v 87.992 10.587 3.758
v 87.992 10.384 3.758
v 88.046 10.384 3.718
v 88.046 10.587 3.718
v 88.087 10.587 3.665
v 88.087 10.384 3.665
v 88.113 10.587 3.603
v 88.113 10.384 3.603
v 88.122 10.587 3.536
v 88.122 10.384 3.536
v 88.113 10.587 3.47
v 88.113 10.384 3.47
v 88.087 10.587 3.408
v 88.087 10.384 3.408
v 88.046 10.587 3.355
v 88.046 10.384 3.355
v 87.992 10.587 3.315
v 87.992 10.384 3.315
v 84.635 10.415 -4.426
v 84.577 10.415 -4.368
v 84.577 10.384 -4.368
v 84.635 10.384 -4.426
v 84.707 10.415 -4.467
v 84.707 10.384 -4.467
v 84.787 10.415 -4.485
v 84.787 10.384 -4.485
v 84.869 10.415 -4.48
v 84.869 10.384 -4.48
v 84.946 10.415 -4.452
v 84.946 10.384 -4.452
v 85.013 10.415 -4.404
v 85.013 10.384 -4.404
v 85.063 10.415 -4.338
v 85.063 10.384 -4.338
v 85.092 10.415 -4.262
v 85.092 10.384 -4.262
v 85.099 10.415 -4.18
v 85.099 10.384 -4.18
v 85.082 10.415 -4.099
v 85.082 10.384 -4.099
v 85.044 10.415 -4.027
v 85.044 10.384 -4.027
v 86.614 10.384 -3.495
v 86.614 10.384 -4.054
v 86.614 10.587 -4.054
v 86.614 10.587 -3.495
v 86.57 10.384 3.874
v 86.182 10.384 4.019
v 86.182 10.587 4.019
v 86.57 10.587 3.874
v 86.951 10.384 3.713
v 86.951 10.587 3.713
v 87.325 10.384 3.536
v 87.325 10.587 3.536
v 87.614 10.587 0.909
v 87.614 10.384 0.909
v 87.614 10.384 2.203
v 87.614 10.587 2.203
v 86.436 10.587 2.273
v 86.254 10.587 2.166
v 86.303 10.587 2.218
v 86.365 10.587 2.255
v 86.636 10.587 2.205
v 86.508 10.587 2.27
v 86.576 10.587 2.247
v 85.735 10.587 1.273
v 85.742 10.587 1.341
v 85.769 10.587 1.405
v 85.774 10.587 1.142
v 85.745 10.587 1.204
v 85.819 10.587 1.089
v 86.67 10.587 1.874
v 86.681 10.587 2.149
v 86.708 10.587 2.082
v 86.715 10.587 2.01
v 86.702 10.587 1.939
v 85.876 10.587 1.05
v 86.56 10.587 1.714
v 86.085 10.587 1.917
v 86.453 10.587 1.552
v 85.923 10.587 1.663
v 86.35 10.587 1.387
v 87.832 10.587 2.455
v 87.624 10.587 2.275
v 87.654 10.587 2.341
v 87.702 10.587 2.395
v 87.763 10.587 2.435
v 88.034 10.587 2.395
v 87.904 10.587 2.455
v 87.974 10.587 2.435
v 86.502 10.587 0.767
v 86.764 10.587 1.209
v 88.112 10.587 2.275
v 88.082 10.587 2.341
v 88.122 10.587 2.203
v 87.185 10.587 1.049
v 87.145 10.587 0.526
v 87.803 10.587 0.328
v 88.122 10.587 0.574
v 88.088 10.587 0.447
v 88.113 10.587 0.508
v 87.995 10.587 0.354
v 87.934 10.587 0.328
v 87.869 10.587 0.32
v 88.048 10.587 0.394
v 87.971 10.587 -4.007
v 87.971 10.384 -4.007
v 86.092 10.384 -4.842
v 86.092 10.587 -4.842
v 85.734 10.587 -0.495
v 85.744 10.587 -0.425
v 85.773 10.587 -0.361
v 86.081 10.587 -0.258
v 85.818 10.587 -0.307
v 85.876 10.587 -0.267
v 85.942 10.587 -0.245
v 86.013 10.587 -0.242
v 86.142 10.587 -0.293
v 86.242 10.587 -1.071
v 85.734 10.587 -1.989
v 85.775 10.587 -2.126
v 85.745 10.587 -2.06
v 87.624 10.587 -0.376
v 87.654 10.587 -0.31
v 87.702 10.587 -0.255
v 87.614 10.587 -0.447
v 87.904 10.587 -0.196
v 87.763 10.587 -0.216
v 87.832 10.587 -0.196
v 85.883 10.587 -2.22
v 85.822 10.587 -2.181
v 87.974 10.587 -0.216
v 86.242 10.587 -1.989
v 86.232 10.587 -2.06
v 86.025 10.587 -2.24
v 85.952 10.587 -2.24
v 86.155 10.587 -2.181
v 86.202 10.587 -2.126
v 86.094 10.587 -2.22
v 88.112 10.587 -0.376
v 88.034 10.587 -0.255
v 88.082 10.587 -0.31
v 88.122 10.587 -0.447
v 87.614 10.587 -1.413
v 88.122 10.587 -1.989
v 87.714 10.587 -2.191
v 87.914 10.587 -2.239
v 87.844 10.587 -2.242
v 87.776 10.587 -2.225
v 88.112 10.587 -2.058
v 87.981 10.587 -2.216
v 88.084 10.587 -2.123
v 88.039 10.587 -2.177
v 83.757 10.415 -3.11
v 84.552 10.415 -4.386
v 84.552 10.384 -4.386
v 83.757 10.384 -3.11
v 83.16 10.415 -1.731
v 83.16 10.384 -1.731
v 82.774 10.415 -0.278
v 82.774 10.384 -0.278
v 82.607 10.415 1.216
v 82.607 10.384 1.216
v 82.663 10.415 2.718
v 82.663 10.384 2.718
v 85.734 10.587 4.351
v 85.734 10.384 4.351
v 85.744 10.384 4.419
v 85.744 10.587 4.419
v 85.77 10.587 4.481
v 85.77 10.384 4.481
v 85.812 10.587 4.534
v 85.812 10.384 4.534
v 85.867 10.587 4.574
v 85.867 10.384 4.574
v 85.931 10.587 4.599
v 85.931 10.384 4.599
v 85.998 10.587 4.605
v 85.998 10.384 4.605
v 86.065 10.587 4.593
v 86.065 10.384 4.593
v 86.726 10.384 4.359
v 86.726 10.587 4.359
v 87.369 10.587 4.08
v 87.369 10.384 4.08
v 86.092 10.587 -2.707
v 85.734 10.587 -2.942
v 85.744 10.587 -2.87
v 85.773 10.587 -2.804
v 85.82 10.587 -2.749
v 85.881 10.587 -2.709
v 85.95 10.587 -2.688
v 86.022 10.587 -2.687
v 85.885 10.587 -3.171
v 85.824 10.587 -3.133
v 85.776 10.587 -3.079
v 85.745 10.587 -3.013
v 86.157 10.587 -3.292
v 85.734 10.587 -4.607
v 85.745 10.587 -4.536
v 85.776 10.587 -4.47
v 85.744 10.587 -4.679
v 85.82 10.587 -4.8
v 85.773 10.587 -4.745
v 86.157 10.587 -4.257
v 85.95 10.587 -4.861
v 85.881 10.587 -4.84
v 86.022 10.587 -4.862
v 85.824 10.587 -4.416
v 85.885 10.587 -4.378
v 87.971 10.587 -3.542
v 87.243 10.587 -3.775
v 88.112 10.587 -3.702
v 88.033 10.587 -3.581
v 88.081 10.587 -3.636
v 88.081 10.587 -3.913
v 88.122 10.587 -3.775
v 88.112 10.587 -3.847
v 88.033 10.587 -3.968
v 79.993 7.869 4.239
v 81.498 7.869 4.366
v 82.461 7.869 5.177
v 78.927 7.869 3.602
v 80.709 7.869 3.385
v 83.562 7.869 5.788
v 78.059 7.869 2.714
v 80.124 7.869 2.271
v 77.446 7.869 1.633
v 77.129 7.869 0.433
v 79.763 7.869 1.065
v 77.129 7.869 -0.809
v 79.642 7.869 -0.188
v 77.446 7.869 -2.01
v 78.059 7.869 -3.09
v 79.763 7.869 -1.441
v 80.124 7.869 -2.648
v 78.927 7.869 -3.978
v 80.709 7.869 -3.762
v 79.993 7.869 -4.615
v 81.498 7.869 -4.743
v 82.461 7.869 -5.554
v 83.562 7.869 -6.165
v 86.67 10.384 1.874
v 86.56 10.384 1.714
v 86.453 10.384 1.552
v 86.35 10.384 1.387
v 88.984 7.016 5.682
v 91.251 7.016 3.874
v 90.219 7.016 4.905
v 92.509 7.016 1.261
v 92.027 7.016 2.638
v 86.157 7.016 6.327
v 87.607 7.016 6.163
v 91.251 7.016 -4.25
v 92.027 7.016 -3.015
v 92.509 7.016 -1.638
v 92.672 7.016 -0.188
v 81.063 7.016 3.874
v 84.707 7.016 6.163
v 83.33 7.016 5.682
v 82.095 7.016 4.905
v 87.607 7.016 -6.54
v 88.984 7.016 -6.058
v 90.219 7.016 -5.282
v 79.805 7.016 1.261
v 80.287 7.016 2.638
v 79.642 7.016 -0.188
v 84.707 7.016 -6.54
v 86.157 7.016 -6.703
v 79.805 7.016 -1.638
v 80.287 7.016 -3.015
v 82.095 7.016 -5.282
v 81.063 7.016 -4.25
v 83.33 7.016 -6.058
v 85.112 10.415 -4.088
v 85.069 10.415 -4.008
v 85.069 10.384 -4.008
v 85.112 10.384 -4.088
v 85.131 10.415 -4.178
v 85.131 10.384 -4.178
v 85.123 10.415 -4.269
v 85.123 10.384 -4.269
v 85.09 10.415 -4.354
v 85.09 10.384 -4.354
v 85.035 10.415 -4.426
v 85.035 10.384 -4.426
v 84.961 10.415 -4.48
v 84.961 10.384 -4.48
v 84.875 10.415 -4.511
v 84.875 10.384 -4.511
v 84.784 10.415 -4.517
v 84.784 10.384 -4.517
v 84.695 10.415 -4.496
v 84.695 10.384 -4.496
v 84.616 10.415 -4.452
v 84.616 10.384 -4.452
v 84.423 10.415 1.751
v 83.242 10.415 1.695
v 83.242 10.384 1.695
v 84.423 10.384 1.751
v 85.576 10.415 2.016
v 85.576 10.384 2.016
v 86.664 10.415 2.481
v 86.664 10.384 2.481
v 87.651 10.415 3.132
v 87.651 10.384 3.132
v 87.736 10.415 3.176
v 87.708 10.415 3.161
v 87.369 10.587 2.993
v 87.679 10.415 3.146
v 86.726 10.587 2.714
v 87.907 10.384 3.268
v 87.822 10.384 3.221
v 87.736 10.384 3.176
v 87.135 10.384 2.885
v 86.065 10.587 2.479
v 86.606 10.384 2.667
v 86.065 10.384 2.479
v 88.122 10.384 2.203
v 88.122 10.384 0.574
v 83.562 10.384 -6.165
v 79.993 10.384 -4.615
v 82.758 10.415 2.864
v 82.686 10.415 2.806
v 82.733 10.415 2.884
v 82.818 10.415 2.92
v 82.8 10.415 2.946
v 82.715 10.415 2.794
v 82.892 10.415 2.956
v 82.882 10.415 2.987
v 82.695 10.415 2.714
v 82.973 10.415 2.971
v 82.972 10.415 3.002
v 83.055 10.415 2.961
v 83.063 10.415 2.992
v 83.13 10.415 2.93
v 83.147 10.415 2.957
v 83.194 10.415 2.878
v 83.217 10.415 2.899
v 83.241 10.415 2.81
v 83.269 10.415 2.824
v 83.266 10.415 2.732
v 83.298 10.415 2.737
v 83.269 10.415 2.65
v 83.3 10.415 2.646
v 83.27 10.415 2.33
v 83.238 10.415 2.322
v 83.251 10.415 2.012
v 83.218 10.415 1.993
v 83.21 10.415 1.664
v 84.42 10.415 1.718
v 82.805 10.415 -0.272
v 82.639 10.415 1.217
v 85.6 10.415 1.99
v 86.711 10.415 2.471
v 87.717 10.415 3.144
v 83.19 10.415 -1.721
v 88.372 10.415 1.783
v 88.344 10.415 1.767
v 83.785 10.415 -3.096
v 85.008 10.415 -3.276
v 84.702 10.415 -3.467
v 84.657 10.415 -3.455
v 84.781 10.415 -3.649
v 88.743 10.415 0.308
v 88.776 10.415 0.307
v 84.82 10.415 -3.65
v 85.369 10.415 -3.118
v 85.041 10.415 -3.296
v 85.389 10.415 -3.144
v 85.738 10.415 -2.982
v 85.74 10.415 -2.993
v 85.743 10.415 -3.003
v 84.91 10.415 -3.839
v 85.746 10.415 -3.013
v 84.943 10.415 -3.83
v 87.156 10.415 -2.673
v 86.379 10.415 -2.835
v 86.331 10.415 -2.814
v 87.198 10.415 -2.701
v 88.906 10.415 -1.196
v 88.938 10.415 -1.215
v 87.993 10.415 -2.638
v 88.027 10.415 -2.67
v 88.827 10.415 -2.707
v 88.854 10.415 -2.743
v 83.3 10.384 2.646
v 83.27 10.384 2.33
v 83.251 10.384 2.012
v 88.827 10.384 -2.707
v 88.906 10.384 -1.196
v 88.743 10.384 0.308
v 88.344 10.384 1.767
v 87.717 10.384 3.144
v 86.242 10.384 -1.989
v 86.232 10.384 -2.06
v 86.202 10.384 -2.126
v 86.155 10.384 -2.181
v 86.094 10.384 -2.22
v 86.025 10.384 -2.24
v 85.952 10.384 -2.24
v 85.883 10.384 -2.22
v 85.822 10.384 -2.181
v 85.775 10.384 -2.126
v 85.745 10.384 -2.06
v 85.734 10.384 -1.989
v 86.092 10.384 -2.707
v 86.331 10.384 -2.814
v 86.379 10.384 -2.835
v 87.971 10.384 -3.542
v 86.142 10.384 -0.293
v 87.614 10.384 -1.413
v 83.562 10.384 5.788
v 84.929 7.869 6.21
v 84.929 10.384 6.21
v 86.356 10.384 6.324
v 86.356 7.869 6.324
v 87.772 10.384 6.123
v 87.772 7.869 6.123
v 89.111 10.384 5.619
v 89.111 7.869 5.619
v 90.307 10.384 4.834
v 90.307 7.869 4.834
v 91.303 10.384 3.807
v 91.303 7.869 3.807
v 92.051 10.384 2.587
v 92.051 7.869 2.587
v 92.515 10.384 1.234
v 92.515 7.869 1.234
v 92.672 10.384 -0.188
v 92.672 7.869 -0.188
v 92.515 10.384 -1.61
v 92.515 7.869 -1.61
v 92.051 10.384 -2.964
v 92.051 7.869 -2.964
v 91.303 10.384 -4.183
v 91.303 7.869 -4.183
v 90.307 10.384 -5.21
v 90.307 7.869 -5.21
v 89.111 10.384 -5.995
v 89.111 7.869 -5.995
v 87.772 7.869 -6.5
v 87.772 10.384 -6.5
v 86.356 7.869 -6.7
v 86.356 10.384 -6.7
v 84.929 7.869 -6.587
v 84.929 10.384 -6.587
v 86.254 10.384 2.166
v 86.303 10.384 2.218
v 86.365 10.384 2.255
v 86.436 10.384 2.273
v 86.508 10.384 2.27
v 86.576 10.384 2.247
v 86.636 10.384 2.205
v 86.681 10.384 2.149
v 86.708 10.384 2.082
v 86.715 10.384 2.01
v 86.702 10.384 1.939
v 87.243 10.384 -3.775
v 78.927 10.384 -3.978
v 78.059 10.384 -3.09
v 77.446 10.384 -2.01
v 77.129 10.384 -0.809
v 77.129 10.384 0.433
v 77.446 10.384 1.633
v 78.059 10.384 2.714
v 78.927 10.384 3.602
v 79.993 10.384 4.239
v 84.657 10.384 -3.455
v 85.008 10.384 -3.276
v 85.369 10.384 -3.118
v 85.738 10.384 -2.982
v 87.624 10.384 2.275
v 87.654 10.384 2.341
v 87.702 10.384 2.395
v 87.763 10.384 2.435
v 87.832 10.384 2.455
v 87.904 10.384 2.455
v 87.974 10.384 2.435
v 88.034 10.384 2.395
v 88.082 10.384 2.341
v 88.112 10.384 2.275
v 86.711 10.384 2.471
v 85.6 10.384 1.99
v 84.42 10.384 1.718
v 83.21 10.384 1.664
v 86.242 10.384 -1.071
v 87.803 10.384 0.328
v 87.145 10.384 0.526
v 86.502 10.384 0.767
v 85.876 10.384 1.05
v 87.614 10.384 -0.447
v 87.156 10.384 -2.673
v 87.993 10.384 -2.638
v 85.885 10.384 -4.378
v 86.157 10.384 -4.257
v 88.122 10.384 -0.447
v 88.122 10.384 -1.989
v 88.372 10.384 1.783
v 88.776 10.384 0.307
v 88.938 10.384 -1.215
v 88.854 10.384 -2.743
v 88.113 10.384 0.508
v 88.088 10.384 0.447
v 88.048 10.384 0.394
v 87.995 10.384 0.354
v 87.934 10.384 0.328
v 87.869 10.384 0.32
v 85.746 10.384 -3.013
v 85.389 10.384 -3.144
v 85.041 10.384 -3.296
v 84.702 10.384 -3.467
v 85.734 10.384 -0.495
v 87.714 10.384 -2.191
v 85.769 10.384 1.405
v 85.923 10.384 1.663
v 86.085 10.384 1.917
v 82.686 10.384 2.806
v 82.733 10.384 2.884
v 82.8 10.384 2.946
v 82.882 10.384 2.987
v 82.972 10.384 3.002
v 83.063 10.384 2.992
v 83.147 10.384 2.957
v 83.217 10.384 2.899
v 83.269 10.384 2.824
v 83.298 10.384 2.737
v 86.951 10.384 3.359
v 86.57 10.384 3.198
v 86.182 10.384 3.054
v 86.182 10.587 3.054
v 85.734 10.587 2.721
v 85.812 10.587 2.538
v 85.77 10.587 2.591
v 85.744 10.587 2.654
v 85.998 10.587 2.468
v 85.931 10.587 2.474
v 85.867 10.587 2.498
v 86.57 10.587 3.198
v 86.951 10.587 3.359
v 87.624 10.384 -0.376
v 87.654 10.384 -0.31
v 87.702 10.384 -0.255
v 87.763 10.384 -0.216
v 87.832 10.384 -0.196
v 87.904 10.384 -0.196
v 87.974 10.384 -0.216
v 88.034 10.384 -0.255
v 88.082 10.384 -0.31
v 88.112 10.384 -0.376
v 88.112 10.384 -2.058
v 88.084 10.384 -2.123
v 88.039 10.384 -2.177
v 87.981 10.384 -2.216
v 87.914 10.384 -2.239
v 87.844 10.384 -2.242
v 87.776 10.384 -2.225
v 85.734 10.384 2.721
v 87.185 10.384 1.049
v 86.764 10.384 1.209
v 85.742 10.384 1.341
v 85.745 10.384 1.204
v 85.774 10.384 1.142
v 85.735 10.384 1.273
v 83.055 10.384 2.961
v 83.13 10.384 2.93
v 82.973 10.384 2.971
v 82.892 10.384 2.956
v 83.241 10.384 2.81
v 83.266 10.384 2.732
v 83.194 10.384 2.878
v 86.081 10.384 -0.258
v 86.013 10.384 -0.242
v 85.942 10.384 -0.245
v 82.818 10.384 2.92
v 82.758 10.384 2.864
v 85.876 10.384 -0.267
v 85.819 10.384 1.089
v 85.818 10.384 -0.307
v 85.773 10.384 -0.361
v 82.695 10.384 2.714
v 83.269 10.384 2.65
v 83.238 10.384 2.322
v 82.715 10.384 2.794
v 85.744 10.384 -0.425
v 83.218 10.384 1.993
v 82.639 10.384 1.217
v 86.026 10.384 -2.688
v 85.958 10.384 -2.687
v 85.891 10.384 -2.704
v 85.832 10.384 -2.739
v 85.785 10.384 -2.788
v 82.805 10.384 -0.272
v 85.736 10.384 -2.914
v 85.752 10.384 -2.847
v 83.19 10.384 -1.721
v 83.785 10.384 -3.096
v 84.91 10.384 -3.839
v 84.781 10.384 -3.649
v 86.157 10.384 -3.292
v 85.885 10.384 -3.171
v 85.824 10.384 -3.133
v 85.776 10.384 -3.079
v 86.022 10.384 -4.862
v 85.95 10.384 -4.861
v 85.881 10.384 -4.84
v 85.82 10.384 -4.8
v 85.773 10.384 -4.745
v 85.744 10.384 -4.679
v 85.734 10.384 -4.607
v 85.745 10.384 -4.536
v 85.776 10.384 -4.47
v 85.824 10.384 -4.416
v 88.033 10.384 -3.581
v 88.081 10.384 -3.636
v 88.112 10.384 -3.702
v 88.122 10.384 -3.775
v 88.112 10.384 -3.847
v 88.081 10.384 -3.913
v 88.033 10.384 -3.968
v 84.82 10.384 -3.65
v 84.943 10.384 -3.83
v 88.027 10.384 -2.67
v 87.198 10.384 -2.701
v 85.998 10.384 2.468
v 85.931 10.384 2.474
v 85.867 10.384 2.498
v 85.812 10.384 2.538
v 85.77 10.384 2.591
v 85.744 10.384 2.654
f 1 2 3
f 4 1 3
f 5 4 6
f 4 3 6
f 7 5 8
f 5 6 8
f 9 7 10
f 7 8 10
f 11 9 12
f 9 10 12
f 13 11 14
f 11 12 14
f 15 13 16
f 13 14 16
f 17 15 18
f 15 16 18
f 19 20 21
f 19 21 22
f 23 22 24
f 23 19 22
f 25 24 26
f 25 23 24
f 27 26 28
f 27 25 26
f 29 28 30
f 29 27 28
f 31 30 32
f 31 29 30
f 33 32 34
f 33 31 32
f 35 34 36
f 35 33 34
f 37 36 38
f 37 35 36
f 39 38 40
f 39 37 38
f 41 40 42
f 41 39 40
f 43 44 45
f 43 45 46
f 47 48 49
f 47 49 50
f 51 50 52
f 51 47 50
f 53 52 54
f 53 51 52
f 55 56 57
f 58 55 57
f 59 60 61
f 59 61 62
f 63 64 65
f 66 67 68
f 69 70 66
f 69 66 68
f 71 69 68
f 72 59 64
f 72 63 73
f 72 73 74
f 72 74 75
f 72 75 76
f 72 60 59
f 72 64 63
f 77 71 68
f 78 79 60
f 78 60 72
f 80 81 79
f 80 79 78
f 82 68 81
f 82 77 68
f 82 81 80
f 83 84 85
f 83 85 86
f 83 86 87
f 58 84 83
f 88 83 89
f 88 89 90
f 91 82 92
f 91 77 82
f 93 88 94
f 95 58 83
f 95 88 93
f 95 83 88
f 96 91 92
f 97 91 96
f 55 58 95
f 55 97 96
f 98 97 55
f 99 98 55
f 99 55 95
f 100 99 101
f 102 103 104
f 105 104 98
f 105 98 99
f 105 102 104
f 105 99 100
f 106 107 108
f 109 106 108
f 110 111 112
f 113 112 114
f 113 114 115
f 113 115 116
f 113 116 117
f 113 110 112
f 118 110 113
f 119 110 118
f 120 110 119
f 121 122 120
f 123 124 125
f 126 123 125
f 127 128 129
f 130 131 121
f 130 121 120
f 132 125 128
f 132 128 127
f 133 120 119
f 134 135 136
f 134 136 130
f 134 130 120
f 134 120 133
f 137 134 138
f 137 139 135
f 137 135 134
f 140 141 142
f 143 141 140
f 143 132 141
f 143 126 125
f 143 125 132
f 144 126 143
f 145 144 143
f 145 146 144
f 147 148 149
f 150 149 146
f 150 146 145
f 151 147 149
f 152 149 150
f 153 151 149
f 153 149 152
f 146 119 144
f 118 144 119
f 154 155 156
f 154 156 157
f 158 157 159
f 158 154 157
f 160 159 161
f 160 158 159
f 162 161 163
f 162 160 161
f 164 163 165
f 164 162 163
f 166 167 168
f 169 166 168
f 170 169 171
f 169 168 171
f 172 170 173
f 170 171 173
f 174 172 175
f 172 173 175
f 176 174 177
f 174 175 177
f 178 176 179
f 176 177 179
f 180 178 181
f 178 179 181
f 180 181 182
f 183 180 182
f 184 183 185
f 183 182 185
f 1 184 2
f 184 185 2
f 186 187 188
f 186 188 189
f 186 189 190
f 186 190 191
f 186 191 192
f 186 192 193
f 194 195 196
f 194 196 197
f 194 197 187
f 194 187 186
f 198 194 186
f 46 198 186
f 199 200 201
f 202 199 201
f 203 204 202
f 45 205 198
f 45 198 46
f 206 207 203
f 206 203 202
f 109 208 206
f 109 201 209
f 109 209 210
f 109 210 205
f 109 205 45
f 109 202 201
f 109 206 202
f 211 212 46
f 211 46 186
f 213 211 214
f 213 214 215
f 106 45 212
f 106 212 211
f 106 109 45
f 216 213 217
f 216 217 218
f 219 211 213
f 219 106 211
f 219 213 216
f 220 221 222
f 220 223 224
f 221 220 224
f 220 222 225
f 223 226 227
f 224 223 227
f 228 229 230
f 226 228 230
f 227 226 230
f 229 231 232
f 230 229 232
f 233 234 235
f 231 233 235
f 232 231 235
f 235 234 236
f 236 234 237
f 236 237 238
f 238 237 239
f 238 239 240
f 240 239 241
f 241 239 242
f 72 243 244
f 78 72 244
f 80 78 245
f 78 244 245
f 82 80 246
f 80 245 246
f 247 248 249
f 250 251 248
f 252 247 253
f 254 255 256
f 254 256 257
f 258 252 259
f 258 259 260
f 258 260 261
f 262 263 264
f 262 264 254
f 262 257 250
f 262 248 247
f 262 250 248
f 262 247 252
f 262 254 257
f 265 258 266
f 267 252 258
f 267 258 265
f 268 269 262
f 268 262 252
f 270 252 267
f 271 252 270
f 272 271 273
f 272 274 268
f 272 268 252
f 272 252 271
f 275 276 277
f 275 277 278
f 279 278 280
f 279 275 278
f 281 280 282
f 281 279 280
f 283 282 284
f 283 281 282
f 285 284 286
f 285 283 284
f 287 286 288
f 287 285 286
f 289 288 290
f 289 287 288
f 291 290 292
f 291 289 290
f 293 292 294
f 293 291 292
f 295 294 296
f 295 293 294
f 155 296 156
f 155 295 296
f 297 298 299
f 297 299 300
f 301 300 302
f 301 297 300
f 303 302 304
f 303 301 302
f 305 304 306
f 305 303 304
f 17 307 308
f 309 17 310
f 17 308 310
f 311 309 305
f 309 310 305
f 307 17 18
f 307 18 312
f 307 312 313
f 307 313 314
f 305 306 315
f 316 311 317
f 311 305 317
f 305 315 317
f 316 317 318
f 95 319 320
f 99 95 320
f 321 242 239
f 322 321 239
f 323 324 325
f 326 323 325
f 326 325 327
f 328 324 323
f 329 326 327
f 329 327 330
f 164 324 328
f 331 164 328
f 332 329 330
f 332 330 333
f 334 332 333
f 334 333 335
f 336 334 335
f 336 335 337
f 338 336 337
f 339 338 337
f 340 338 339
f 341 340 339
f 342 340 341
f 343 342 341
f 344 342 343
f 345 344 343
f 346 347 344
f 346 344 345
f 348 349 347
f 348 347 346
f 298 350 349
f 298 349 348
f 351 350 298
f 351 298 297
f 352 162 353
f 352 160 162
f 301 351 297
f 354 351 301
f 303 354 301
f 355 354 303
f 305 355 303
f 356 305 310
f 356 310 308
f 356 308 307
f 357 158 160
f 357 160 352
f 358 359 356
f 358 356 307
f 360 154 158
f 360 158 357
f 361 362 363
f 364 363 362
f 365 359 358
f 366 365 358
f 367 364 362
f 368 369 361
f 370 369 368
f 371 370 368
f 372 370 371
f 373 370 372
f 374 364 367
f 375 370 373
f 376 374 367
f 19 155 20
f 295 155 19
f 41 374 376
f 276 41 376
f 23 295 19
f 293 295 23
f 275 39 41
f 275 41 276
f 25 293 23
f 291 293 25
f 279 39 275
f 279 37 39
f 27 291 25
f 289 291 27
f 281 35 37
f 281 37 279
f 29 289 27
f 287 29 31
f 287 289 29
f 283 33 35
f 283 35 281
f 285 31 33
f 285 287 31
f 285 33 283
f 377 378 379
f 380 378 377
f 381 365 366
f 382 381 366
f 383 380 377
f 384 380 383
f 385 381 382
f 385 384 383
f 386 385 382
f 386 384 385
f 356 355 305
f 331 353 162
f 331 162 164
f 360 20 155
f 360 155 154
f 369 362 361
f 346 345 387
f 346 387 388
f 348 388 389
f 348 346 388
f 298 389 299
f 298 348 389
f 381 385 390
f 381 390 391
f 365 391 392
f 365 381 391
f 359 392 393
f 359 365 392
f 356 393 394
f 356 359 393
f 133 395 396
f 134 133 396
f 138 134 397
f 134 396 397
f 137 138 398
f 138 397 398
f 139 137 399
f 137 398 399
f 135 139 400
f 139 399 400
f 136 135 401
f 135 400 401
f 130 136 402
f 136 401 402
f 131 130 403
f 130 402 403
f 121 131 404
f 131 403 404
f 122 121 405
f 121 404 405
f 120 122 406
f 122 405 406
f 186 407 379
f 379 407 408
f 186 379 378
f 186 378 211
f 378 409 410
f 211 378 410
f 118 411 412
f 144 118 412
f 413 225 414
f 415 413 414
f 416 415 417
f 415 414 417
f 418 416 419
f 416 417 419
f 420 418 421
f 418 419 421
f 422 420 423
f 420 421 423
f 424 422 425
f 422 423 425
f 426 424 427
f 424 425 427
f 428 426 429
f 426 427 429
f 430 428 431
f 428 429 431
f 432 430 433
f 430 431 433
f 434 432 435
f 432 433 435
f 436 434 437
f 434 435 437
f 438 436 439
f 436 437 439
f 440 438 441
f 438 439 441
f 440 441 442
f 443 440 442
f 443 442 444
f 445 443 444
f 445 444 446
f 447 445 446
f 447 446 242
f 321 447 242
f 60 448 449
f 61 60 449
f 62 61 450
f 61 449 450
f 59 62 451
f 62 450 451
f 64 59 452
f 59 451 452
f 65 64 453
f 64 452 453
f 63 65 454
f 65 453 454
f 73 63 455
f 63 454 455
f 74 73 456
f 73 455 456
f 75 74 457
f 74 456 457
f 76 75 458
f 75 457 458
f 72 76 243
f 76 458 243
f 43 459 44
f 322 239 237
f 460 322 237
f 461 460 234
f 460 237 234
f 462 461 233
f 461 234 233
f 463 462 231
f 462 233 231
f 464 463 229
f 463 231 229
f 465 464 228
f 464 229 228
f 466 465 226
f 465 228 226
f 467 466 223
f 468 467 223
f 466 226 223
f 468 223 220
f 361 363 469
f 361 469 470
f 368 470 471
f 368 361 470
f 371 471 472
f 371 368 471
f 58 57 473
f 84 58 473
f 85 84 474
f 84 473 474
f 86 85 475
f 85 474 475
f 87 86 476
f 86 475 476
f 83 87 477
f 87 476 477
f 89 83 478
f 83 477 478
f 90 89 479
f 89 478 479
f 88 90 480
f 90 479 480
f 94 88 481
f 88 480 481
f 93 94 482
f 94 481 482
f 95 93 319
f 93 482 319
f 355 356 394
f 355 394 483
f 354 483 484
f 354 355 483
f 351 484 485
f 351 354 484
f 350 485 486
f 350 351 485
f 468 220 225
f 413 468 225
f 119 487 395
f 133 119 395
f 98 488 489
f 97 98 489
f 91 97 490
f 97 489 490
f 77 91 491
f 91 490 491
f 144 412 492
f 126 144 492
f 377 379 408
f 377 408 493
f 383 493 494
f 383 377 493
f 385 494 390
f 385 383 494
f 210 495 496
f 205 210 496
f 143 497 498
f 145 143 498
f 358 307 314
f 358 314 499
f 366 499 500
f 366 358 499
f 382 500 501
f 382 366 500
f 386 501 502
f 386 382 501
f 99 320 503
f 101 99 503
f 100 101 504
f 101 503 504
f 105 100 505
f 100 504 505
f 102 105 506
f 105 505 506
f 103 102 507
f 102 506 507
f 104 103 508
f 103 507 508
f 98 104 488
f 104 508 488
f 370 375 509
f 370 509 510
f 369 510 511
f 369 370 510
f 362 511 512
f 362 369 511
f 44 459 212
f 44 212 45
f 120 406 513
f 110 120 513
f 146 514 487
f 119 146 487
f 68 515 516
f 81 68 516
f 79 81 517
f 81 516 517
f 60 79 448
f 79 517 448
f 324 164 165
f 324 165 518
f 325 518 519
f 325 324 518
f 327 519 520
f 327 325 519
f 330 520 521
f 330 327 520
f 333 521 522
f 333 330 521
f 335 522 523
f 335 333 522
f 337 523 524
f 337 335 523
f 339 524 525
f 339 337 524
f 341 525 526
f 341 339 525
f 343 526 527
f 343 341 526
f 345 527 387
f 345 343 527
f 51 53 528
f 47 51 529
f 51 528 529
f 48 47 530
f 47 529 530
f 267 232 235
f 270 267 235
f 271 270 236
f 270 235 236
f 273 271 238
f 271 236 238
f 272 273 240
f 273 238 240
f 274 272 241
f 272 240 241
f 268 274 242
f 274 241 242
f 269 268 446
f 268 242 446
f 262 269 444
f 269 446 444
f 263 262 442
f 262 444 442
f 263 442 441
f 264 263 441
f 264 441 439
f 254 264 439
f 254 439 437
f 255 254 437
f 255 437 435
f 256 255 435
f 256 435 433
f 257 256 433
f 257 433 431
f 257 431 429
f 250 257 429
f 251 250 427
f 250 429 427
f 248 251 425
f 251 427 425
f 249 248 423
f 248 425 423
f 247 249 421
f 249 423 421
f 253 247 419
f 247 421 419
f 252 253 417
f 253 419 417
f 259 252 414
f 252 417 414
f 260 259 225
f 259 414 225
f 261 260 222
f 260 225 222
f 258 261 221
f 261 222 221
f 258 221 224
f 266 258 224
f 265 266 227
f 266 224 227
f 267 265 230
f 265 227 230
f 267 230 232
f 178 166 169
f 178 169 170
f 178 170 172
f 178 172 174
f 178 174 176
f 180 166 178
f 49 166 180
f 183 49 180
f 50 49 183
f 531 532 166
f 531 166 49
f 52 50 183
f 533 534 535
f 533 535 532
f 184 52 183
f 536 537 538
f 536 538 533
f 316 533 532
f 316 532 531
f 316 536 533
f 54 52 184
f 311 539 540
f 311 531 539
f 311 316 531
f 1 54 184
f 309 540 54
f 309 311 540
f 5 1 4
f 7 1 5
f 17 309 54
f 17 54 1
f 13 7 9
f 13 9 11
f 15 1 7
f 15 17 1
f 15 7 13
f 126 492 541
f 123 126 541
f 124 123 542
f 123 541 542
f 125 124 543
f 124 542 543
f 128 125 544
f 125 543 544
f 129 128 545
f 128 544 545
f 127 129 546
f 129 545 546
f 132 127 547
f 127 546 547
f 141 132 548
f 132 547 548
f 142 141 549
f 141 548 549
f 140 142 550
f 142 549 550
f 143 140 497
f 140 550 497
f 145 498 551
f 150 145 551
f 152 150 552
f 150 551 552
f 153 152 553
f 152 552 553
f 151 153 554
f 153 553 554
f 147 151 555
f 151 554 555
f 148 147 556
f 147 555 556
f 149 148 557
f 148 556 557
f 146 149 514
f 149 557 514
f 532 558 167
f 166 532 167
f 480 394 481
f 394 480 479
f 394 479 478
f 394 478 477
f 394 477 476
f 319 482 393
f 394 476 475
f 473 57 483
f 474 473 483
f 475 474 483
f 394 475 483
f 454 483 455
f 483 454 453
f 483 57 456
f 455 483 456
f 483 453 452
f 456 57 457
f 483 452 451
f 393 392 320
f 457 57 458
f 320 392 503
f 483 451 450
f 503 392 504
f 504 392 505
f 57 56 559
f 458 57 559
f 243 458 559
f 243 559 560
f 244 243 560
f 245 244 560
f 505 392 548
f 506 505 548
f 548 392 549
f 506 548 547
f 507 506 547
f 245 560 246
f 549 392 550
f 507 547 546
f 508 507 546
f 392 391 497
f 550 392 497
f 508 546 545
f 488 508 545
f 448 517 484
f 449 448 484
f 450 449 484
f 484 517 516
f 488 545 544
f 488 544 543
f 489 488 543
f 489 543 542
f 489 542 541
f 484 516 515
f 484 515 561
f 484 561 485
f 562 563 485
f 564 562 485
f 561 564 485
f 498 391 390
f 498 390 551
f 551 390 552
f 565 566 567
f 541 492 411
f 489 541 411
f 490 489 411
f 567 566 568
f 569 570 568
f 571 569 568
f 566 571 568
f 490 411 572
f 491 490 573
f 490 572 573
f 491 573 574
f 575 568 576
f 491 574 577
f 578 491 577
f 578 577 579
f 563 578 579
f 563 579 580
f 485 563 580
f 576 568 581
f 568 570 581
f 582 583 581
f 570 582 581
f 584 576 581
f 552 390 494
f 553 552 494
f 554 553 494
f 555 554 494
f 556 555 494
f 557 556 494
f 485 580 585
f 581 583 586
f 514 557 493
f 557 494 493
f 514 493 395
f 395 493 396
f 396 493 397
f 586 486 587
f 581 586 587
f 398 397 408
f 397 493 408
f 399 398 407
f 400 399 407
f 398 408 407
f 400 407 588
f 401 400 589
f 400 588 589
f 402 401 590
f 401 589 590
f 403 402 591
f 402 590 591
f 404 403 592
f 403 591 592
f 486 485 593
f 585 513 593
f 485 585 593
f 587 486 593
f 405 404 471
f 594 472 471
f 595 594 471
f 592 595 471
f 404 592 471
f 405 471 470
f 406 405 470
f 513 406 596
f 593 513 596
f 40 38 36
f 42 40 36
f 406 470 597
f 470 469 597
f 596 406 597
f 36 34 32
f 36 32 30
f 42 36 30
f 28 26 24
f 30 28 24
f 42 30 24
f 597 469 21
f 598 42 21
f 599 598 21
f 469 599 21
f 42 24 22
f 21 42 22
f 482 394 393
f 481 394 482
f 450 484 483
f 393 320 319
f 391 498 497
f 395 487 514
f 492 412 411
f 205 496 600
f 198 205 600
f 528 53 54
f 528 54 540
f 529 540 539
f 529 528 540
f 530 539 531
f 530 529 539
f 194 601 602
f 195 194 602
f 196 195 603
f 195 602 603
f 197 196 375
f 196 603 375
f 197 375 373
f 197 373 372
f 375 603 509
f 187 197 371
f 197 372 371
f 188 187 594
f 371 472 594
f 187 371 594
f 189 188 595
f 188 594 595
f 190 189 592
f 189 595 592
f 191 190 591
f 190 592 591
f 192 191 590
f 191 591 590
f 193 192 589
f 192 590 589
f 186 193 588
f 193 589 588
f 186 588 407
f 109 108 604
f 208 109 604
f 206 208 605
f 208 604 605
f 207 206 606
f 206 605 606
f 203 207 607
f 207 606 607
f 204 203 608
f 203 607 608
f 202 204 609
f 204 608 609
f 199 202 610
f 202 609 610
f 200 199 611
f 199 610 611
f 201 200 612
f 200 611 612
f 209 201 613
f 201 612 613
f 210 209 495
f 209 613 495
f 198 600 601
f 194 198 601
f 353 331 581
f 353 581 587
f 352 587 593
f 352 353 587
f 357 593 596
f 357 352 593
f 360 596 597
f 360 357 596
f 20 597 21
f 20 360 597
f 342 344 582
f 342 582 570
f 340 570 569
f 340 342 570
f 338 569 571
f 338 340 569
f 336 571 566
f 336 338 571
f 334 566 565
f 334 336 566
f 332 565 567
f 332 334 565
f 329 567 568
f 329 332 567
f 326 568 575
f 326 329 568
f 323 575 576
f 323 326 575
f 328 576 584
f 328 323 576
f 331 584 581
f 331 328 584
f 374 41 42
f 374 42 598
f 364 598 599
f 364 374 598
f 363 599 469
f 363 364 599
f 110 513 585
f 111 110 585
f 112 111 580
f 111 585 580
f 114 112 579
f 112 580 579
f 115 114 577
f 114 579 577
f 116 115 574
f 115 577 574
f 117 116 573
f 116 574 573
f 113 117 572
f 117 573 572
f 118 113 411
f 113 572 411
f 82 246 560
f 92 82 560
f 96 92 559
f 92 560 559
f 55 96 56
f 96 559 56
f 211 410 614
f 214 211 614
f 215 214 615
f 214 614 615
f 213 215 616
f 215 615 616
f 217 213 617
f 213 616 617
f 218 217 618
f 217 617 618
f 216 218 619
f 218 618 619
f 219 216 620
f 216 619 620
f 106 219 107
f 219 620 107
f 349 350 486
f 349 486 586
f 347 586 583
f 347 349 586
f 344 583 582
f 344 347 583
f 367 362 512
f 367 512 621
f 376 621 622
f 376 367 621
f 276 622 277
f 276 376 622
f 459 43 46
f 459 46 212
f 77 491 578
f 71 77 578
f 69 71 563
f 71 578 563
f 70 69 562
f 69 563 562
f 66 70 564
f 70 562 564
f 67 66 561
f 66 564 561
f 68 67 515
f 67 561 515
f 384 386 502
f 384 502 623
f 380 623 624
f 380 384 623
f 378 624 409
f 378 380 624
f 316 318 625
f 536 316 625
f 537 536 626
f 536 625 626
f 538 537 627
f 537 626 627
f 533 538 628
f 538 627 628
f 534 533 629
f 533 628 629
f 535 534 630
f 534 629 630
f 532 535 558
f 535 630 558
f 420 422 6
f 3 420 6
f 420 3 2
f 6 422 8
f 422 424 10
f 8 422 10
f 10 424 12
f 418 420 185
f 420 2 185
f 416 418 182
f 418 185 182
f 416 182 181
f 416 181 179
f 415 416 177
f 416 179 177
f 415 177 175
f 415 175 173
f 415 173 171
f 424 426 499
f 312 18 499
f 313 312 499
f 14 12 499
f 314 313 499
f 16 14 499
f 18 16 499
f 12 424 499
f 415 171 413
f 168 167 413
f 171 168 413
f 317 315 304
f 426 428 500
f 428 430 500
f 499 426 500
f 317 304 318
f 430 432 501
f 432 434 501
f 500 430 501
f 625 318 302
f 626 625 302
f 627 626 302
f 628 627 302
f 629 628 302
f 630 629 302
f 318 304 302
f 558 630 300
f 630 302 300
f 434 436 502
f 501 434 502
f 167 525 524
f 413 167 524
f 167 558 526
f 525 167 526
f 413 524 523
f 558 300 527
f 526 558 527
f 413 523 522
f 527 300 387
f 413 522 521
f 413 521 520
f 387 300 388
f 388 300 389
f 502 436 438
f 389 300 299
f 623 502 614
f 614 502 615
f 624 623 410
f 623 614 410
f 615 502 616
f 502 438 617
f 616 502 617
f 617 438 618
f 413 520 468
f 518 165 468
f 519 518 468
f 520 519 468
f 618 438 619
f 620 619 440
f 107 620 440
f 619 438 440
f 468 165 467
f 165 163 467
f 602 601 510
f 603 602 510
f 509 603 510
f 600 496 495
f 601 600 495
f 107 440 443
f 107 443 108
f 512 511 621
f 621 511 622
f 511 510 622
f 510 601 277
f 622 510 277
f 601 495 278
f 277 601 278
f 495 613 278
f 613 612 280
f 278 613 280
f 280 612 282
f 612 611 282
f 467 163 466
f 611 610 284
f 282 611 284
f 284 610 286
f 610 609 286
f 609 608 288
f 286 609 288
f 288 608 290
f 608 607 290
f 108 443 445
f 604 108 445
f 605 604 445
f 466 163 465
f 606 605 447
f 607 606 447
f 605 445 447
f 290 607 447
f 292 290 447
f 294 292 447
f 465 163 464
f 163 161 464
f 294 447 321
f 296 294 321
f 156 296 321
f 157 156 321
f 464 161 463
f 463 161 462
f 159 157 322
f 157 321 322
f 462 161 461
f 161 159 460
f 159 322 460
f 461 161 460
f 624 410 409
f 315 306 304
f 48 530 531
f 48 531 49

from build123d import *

# Parameters (mm, degrees)
SKETCH1_R           = 6.5151
BOSS_EXTRUDE1_DEPTH = 3.3676
BOSS_EXTRUDE2_DEPTH = 2.5146
BOSS_EXTRUDE3_DEPTH = 0.03175
BOSS_EXTRUDE4_DEPTH = 0.2032
BOSS_EXTRUDE5_DEPTH = 0.2032
BOSS_EXTRUDE6_DEPTH = 0.2032
BOSS_EXTRUDE7_DEPTH = 0.2032


with BuildPart() as part:
    # Sketch1 → Boss-Extrude1 (new body)
    with BuildSketch(Plane(origin=(0, 10.383607632, 0), x_dir=(-1, 0, 0), z_dir=(0, -1, 0))):
        with Locations((-86.1568, 0.188358884)):
            Circle(SKETCH1_R)
    extrude(amount=BOSS_EXTRUDE1_DEPTH)

    # Sketch2 → Boss-Extrude2 (add)
    with BuildSketch(Plane(origin=(0, 7.869007632, 0), x_dir=(1, 0, 0), z_dir=(0, 1, 0))):
        with BuildLine():
            Line((83.562463772, 6.164640968), (79.993269461, 4.615234502))
            ThreePointArc((79.993269461, 4.615234502), (77.089, 0.188358884), (79.993269461, -4.238516734))
            Line((79.993269461, -4.238516734), (83.562463772, -5.7879232))
            ThreePointArc((83.562463772, -5.7879232), (92.6719, 0.188358884), (83.562463772, 6.164640968))
        make_face()
    extrude(amount=BOSS_EXTRUDE2_DEPTH)

    # Sketch3 → Boss-Extrude3 (add)
    with BuildSketch(Plane(origin=(0, 10.415357632, 0), x_dir=(1, 0, 0), z_dir=(0, 1, 0))):
        with BuildLine():
            Line((86.379362148, 2.834929745), (86.331172499, 2.813512123))
            ThreePointArc((86.331172499, 2.813512123), (87.57388973, 2.642364143), (88.826675515, 2.706905023))
            ThreePointArc((88.826675515, 2.706905023), (88.743147222, -0.307968876), (87.717246323, -3.144158035))
            ThreePointArc((87.717246323, -3.144158035), (85.599615489, -1.990016157), (83.209989222, -1.664301363))
            ThreePointArc((83.209989222, -1.664301363), (83.226670097, -2.157743319), (83.268922831, -2.649655834))
            ThreePointArc((83.268922831, -2.649655834), (83.013982099, -2.96896843), (82.694669503, -2.714027698))
            ThreePointArc((82.694669503, -2.714027698), (82.970684724, 1.003656964), (84.577363687, 4.367575269))
            ThreePointArc((84.577363687, 4.367575269), (84.981125023, 4.430281687), (85.043831441, 4.026520351))
            ThreePointArc((85.043831441, 4.026520351), (84.845175329, 3.744205128), (84.656890151, 3.45486998))
            ThreePointArc((84.656890151, 3.45486998), (85.187045427, 3.19462014), (85.738141542, 2.982281574))
            ThreePointArc((85.738141542, 2.982281574), (85.741341744, 2.997904944), (85.745516089, 3.013296689))
            ThreePointArc((85.745516089, 3.013296689), (85.213902251, 3.217551458), (84.701749715, 3.466615834))
            ThreePointArc((84.701749715, 3.466615834), (84.880937437, 3.740370401), (85.069461538, 4.00778107))
            ThreePointArc((85.069461538, 4.00778107), (84.999864331, 4.455911764), (84.551733629, 4.386314602))
            ThreePointArc((84.551733629, 4.386314602), (82.940000597, 1.01181459), (82.663117122, -2.717564614))
            ThreePointArc((82.663117122, -2.717564614), (83.017519015, -3.000520811), (83.300475212, -2.646118918))
            ThreePointArc((83.300475212, -2.646118918), (83.259289868, -2.171130031), (83.242027928, -1.694671533))
            ThreePointArc((83.242027928, -1.694671533), (85.576128395, -2.015738406), (87.651108795, -3.131787359))
            ThreePointArc((87.651108795, -3.131787359), (87.69360158, -3.153679255), (87.735992687, -3.175767397))
            ThreePointArc((87.735992687, -3.175767397), (88.775617442, -0.307140697), (88.853849034, 2.743059067))
            ThreePointArc((88.853849034, 2.743059067), (87.612284437, 2.672606475), (86.379362148, 2.834929745))
        make_face()
    extrude(amount=-BOSS_EXTRUDE3_DEPTH)

    # Sketch4 → Boss-Extrude4 (add)
    with BuildSketch(Plane(origin=(0, 10.383607632, 0), x_dir=(1, 0, 0), z_dir=(0, 1, 0))):
        with BuildLine():
            Line((87.971211641, 4.006634675), (86.091611641, 4.842012453))
            ThreePointArc((86.091611641, 4.842012453), (85.756344283, 4.713063514), (85.8852933, 4.377796186))
            Line((85.8852933, 4.377796186), (86.1568, 4.257126542))
            Line((86.1568, 4.257126542), (86.1568, 3.291926542))
            Line((86.1568, 3.291926542), (85.8852933, 3.171256897))
            ThreePointArc((85.8852933, 3.171256897), (85.756344337, 2.835989594), (86.091611641, 2.707040631))
            Line((86.091611641, 2.707040631), (87.971211641, 3.542418409))
            ThreePointArc((87.971211641, 3.542418409), (88.12205247, 3.774526542), (87.971211641, 4.006634675))
        make_face()
        Polygon((87.24265, 3.774526542), (86.614, 4.053926542), (86.614, 3.495126542), align=None, mode=Mode.SUBTRACT)
    extrude(amount=BOSS_EXTRUDE4_DEPTH)

    # Sketch5 → Boss-Extrude5 (add)
    with BuildSketch(Plane(origin=(0, 10.383607632, 0), x_dir=(1, 0, 0), z_dir=(0, 1, 0))):
        with BuildLine():
            Line((88.12205247, 0.447338975), (88.12205247, 1.988743646))
            ThreePointArc((88.12205247, 1.988743646), (87.980866694, 2.216315505), (87.714265455, 2.19089595))
            Line((87.714265455, 2.19089595), (86.24245247, 1.071216772))
            Line((86.24245247, 1.071216772), (86.24245247, 1.988743646))
            ThreePointArc((86.24245247, 1.988743646), (85.98845247, 2.242743706), (85.73445247, 1.988743646))
            Line((85.73445247, 1.988743646), (85.73445247, 0.495012101))
            ThreePointArc((85.73445247, 0.495012101), (85.875638247, 0.267440242), (86.142239485, 0.292859797))
            Line((86.142239485, 0.292859797), (87.61405247, 1.412538975))
            Line((87.61405247, 1.412538975), (87.61405247, 0.447338975))
            ThreePointArc((87.61405247, 0.447338975), (87.86805247, 0.193338975), (88.12205247, 0.447338975))
        make_face()
    extrude(amount=BOSS_EXTRUDE5_DEPTH)

    # Sketch6 → Boss-Extrude6 (add)
    with BuildSketch(Plane(origin=(0, 10.383607632, 0), x_dir=(1, 0, 0), z_dir=(0, 1, 0))):
        with BuildLine():
            Line((88.12205247, -2.20349139), (88.12205247, -0.573641116))
            ThreePointArc((88.12205247, -0.573641116), (88.022972158, -0.372355522), (87.803029713, -0.328104884))
            ThreePointArc((87.803029713, -0.328104884), (86.82154331, -0.641121728), (85.876084624, -1.050270813))
            ThreePointArc((85.876084624, -1.050270813), (85.745367006, -1.204405708), (85.76854522, -1.405172817))
            ThreePointArc((85.76854522, -1.405172817), (86.002778478, -1.790740386), (86.25361081, -2.165721333))
            ThreePointArc((86.25361081, -2.165721333), (86.607396093, -2.227914435), (86.669589172, -1.874129148))
            ThreePointArc((86.669589172, -1.874129148), (86.505953581, -1.633172635), (86.349528836, -1.387473738))
            ThreePointArc((86.349528836, -1.387473738), (86.973563185, -1.12669528), (87.61405247, -0.909444852))
            Line((87.61405247, -0.909444852), (87.61405247, -2.20349139))
            ThreePointArc((87.61405247, -2.20349139), (87.86805247, -2.45749139), (88.12205247, -2.20349139))
        make_face()
    extrude(amount=BOSS_EXTRUDE6_DEPTH)

    # Sketch7 → Boss-Extrude7 (add)
    with BuildSketch(Plane(origin=(0, 10.383607632, 0), x_dir=(1, 0, 0), z_dir=(0, 1, 0))):
        with BuildLine():
            Line((85.73445247, -2.721325206), (85.73445247, -4.351175481))
            ThreePointArc((85.73445247, -4.351175481), (85.838455656, -4.55615586), (86.065294641, -4.593273149))
            ThreePointArc((86.065294641, -4.593273149), (87.050038854, -4.224609495), (87.992239729, -3.75782093))
            ThreePointArc((87.992239729, -3.75782093), (88.12205247, -3.536250363), (87.992239763, -3.314679777))
            ThreePointArc((87.992239763, -3.314679777), (87.050038872, -2.8478912), (86.065294641, -2.479227539))
            ThreePointArc((86.065294641, -2.479227539), (85.838455656, -2.516344828), (85.73445247, -2.721325206))
        make_face()
        with BuildLine():
            Line((86.1822, -3.053650344), (86.1822, -4.018850344))
            ThreePointArc((86.1822, -4.018850344), (86.761323847, -3.795601976), (87.325204148, -3.536250344))
            ThreePointArc((87.325204148, -3.536250344), (86.761323847, -3.276898711), (86.1822, -3.053650344))
        make_face(mode=Mode.SUBTRACT)
    extrude(amount=BOSS_EXTRUDE7_DEPTH)


solid = part.part
